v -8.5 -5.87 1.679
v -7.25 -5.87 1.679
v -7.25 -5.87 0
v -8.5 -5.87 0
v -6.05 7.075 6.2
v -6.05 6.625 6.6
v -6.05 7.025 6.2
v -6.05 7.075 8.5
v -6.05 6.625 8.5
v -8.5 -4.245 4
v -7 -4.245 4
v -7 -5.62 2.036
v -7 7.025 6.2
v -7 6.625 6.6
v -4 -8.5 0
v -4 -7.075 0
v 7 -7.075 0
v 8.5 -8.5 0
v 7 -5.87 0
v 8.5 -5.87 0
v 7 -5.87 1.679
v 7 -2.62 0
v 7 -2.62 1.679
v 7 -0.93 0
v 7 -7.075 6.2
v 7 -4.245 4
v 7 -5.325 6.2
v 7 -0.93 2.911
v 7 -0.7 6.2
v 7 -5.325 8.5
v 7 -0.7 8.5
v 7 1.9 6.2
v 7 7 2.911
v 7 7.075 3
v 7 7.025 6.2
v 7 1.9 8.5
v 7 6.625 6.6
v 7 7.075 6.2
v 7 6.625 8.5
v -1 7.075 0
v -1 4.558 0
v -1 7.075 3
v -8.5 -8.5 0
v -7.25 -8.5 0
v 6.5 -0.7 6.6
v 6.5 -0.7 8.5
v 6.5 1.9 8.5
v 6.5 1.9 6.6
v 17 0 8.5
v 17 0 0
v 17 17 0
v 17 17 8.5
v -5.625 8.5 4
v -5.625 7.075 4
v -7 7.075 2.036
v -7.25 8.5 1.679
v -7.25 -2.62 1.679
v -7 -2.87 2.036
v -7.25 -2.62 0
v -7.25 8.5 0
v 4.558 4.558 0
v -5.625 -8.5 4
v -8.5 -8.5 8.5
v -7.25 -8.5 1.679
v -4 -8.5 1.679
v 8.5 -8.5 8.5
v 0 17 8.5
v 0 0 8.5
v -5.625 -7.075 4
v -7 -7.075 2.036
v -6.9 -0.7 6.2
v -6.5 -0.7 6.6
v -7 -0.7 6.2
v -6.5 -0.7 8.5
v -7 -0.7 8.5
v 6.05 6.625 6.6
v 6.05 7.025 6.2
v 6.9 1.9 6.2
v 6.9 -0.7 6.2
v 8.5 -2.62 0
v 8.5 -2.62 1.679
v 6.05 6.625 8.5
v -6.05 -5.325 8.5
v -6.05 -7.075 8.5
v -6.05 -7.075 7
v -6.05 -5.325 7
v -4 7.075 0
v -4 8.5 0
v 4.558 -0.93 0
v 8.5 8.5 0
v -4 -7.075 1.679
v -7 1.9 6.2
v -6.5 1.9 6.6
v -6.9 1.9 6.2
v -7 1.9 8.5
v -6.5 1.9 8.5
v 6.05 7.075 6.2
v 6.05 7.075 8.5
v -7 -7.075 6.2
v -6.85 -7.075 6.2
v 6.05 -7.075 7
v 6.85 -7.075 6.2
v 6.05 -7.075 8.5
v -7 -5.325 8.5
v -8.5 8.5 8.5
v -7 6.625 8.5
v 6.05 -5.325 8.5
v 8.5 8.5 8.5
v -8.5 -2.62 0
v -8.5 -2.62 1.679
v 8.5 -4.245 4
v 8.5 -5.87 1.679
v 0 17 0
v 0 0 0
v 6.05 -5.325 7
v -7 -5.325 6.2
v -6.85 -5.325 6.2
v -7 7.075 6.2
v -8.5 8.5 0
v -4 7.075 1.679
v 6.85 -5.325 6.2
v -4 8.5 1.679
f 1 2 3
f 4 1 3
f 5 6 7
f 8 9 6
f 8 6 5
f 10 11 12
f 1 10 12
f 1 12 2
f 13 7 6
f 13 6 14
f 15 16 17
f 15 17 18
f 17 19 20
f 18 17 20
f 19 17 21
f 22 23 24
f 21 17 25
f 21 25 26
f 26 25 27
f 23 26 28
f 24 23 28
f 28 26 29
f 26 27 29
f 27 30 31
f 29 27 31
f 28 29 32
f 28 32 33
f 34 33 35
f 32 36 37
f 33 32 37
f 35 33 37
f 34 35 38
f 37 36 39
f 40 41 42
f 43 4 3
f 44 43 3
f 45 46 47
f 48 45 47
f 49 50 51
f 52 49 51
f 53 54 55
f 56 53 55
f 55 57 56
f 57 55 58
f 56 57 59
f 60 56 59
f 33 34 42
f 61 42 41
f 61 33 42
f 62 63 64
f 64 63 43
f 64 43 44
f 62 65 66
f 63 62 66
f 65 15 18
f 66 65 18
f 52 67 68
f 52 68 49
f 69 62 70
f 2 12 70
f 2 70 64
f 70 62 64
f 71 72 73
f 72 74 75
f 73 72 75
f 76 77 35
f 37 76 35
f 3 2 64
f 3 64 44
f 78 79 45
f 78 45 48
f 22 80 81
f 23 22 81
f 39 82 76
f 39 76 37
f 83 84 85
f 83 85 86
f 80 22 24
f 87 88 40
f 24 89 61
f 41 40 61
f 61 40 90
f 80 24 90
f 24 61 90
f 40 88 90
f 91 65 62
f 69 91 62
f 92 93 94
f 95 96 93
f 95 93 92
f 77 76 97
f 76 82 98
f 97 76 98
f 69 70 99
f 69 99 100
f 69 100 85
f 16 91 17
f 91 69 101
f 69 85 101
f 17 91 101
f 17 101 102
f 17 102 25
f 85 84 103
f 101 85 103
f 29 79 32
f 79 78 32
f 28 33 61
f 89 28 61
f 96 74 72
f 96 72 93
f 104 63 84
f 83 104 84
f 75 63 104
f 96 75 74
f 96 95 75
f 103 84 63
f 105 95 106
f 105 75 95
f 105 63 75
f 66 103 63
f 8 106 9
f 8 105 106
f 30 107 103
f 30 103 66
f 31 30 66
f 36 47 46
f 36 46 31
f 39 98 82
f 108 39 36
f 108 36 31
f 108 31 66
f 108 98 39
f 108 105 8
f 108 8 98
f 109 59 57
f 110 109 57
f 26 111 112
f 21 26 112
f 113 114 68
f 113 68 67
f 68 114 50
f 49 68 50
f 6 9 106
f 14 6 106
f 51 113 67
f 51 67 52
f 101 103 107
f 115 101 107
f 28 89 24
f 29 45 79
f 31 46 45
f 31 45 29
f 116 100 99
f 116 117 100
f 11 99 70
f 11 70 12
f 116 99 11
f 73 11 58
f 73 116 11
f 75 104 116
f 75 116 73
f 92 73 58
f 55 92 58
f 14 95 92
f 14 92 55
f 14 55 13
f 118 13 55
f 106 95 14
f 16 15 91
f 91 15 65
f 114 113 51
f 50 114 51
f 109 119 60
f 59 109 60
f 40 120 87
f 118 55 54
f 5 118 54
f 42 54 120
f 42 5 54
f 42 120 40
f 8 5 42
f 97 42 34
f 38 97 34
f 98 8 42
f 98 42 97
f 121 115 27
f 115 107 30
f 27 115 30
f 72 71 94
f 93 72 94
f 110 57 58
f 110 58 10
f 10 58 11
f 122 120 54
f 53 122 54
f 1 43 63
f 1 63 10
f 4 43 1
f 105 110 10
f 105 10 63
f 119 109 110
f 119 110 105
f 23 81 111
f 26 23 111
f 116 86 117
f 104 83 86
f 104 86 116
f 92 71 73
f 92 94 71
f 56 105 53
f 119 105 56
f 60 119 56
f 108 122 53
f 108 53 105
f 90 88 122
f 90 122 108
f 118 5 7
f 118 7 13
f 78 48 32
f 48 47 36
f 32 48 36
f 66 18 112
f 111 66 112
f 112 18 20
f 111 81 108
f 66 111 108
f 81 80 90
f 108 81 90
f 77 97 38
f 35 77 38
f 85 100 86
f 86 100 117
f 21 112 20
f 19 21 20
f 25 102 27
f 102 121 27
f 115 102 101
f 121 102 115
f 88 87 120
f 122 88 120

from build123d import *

# Parameters (mm, degrees)
BOX_W                      = 17
BOX_H                      = 17
BOX_DEPTH                  = 8.5
EXTRUDE002_DEPTH           = 25
EXTRUDE002_PLACEMENT_ANGLE = 90
LINK_PLACEMENT_ANGLE       = 90
SKETCH001_W                = 14
SKETCH001_H                = 14.15
EXTRUDE_DEPTH              = 10
BOX001_W                   = 17
BOX001_H                   = 17
BOX001_DEPTH               = 8.5
SKETCH002_W                = 0.95
SKETCH002_H                = 0.45
SKETCH002_W_2              = 0.5
SKETCH002_H_2              = 2.6
SKETCH002_H_3              = 1.75
EXTRUDE001_DEPTH           = 2.3
CHAMFER_1_SIZE             = 0.8
CHAMFER_2_SIZE             = 0.4
EXTRUDE003_DEPTH           = 8
CLONE_PLACEMENT_ANGLE      = 270


with BuildPart() as body:
    # Box → Box (join)
    with BuildSketch(Plane.XY):
        with Locations((8.5, 8.5)):
            Rectangle(BOX_W, BOX_H)
    extrude(amount=BOX_DEPTH)


with BuildPart() as extrude002:
    # Sketch004 → Extrude002 (new body, symmetric)
    with BuildSketch(Plane.XZ):
        Polygon((-8.5, 0), (-5.25, 0), (-5.25, 1.679259), (-6.875, 4), (-8.5, 1.679259), align=None)
    extrude(amount=EXTRUDE002_DEPTH, both=True)


with BuildPart() as extrude002_1:
    # Extrude002 placement: moved
    add(extrude002.part.moved(Location((0, 2.63, 0))).rotate(Axis((0, 2.63, 0), (0, 0, 1)), EXTRUDE002_PLACEMENT_ANGLE))


with BuildPart() as extrude003:
    # Link base: copy of Extrude002
    add(extrude002_1.part)


with BuildPart() as extrude003_1:
    # Link placement: moved
    add(extrude003.part.moved(Location((-1.38, 0, 0))).rotate(Axis((-1.38, 0, 0), (0, 0, -1)), LINK_PLACEMENT_ANGLE))


with BuildPart() as extrude_body:
    # Sketch001 (on Face6 of Box001) → Extrude (new body)
    with BuildSketch(Plane(origin=(-8.5, -8.5, 8.5), x_dir=(1, 0, 0), z_dir=(0, 0, 1))):
        with Locations((8.5, 8.5)):
            Rectangle(SKETCH001_W, SKETCH001_H)
    extrude(amount=-EXTRUDE_DEPTH)


with BuildPart() as cut002:
    # Box001 → Box001 (new body)
    with BuildSketch(Plane(origin=(-8.5, -8.5, 0), x_dir=(1, 0, 0), z_dir=(0, 0, 1))):
        with Locations((8.5, 8.5)):
            Rectangle(BOX001_W, BOX001_H)
    extrude(amount=BOX001_DEPTH)

    # Cut: cut Extrude body
    add(extrude_body.part, mode=Mode.SUBTRACT)

    # Cut001: cut Extrude002
    add(extrude002_1.part, mode=Mode.SUBTRACT)

    # Cut002: cut Extrude003
    add(extrude003_1.part, mode=Mode.SUBTRACT)


with BuildPart() as chamfer_body:
    # Sketch002 (on Face3 of Cut) → Extrude001 (new body)
    with BuildSketch(Plane.XY.offset(8.5)):
        with Locations((6.525, 6.85)):
            Rectangle(SKETCH002_W, SKETCH002_H)
        with Locations((6.75, 0.6)):
            Rectangle(SKETCH002_W_2, SKETCH002_H_2)
        with Locations((6.525, -6.2)):
            Rectangle(SKETCH002_W, SKETCH002_H_3)
    extrude(amount=-EXTRUDE001_DEPTH)

    # Chamfer 1
    chamfer_1_edges = [chamfer_body.edges().sort_by_distance(p)[0] for p in [
        (6.05, -6.2, 6.2),
    ]]
    chamfer(chamfer_1_edges, length=CHAMFER_1_SIZE)

    # Chamfer 2
    chamfer_2_edges = [chamfer_body.edges().sort_by_distance(p)[0] for p in [
        (6.525, 6.625, 6.2),
        (6.5, 0.6, 6.2),
    ]]
    chamfer(chamfer_2_edges, length=CHAMFER_2_SIZE)


with BuildPart() as part_mirroring:
    # Part__Mirroring: instance of Chamfer body
    add(chamfer_body.part.mirror(Plane(origin=(0, 0, 0), x_dir=(0, -1, 0), z_dir=(1, 0, 0))))


with BuildPart() as extrude004:
    # Sketch005 (on Face12 of Cut002) → Extrude003 (new body)
    with BuildSketch(Plane(origin=(7, 0, 0), x_dir=(0, -1, 0), z_dir=(-1, 0, 0))):
        Polygon((-7.075, 3), (-4.557701, 0), (-7.075, 0), align=None)
    extrude(amount=EXTRUDE003_DEPTH)


with BuildPart() as extrude005:
    # Clone base: copy of Extrude004
    add(extrude004.part)


with BuildPart() as extrude005_1:
    # Clone placement: moved
    add(extrude005.part.moved(Location((0, 6.07, 0))).rotate(Axis((0, 6.07, 0), (0, 0, 1)), CLONE_PLACEMENT_ANGLE))


with BuildPart() as chamfer001:
    # Clone001 base: copy of Chamfer body
    add(chamfer_body.part)


with BuildPart() as fusion:
    # Fusion base: copy of Extrude004
    add(extrude004.part)

    # Fusion: union Cut002, Part__Mirroring, Extrude005, Chamfer001
    add(cut002.part)
    add(part_mirroring.part)
    add(extrude005_1.part)
    add(chamfer001.part)


solid = Compound([body.part, fusion.part])
